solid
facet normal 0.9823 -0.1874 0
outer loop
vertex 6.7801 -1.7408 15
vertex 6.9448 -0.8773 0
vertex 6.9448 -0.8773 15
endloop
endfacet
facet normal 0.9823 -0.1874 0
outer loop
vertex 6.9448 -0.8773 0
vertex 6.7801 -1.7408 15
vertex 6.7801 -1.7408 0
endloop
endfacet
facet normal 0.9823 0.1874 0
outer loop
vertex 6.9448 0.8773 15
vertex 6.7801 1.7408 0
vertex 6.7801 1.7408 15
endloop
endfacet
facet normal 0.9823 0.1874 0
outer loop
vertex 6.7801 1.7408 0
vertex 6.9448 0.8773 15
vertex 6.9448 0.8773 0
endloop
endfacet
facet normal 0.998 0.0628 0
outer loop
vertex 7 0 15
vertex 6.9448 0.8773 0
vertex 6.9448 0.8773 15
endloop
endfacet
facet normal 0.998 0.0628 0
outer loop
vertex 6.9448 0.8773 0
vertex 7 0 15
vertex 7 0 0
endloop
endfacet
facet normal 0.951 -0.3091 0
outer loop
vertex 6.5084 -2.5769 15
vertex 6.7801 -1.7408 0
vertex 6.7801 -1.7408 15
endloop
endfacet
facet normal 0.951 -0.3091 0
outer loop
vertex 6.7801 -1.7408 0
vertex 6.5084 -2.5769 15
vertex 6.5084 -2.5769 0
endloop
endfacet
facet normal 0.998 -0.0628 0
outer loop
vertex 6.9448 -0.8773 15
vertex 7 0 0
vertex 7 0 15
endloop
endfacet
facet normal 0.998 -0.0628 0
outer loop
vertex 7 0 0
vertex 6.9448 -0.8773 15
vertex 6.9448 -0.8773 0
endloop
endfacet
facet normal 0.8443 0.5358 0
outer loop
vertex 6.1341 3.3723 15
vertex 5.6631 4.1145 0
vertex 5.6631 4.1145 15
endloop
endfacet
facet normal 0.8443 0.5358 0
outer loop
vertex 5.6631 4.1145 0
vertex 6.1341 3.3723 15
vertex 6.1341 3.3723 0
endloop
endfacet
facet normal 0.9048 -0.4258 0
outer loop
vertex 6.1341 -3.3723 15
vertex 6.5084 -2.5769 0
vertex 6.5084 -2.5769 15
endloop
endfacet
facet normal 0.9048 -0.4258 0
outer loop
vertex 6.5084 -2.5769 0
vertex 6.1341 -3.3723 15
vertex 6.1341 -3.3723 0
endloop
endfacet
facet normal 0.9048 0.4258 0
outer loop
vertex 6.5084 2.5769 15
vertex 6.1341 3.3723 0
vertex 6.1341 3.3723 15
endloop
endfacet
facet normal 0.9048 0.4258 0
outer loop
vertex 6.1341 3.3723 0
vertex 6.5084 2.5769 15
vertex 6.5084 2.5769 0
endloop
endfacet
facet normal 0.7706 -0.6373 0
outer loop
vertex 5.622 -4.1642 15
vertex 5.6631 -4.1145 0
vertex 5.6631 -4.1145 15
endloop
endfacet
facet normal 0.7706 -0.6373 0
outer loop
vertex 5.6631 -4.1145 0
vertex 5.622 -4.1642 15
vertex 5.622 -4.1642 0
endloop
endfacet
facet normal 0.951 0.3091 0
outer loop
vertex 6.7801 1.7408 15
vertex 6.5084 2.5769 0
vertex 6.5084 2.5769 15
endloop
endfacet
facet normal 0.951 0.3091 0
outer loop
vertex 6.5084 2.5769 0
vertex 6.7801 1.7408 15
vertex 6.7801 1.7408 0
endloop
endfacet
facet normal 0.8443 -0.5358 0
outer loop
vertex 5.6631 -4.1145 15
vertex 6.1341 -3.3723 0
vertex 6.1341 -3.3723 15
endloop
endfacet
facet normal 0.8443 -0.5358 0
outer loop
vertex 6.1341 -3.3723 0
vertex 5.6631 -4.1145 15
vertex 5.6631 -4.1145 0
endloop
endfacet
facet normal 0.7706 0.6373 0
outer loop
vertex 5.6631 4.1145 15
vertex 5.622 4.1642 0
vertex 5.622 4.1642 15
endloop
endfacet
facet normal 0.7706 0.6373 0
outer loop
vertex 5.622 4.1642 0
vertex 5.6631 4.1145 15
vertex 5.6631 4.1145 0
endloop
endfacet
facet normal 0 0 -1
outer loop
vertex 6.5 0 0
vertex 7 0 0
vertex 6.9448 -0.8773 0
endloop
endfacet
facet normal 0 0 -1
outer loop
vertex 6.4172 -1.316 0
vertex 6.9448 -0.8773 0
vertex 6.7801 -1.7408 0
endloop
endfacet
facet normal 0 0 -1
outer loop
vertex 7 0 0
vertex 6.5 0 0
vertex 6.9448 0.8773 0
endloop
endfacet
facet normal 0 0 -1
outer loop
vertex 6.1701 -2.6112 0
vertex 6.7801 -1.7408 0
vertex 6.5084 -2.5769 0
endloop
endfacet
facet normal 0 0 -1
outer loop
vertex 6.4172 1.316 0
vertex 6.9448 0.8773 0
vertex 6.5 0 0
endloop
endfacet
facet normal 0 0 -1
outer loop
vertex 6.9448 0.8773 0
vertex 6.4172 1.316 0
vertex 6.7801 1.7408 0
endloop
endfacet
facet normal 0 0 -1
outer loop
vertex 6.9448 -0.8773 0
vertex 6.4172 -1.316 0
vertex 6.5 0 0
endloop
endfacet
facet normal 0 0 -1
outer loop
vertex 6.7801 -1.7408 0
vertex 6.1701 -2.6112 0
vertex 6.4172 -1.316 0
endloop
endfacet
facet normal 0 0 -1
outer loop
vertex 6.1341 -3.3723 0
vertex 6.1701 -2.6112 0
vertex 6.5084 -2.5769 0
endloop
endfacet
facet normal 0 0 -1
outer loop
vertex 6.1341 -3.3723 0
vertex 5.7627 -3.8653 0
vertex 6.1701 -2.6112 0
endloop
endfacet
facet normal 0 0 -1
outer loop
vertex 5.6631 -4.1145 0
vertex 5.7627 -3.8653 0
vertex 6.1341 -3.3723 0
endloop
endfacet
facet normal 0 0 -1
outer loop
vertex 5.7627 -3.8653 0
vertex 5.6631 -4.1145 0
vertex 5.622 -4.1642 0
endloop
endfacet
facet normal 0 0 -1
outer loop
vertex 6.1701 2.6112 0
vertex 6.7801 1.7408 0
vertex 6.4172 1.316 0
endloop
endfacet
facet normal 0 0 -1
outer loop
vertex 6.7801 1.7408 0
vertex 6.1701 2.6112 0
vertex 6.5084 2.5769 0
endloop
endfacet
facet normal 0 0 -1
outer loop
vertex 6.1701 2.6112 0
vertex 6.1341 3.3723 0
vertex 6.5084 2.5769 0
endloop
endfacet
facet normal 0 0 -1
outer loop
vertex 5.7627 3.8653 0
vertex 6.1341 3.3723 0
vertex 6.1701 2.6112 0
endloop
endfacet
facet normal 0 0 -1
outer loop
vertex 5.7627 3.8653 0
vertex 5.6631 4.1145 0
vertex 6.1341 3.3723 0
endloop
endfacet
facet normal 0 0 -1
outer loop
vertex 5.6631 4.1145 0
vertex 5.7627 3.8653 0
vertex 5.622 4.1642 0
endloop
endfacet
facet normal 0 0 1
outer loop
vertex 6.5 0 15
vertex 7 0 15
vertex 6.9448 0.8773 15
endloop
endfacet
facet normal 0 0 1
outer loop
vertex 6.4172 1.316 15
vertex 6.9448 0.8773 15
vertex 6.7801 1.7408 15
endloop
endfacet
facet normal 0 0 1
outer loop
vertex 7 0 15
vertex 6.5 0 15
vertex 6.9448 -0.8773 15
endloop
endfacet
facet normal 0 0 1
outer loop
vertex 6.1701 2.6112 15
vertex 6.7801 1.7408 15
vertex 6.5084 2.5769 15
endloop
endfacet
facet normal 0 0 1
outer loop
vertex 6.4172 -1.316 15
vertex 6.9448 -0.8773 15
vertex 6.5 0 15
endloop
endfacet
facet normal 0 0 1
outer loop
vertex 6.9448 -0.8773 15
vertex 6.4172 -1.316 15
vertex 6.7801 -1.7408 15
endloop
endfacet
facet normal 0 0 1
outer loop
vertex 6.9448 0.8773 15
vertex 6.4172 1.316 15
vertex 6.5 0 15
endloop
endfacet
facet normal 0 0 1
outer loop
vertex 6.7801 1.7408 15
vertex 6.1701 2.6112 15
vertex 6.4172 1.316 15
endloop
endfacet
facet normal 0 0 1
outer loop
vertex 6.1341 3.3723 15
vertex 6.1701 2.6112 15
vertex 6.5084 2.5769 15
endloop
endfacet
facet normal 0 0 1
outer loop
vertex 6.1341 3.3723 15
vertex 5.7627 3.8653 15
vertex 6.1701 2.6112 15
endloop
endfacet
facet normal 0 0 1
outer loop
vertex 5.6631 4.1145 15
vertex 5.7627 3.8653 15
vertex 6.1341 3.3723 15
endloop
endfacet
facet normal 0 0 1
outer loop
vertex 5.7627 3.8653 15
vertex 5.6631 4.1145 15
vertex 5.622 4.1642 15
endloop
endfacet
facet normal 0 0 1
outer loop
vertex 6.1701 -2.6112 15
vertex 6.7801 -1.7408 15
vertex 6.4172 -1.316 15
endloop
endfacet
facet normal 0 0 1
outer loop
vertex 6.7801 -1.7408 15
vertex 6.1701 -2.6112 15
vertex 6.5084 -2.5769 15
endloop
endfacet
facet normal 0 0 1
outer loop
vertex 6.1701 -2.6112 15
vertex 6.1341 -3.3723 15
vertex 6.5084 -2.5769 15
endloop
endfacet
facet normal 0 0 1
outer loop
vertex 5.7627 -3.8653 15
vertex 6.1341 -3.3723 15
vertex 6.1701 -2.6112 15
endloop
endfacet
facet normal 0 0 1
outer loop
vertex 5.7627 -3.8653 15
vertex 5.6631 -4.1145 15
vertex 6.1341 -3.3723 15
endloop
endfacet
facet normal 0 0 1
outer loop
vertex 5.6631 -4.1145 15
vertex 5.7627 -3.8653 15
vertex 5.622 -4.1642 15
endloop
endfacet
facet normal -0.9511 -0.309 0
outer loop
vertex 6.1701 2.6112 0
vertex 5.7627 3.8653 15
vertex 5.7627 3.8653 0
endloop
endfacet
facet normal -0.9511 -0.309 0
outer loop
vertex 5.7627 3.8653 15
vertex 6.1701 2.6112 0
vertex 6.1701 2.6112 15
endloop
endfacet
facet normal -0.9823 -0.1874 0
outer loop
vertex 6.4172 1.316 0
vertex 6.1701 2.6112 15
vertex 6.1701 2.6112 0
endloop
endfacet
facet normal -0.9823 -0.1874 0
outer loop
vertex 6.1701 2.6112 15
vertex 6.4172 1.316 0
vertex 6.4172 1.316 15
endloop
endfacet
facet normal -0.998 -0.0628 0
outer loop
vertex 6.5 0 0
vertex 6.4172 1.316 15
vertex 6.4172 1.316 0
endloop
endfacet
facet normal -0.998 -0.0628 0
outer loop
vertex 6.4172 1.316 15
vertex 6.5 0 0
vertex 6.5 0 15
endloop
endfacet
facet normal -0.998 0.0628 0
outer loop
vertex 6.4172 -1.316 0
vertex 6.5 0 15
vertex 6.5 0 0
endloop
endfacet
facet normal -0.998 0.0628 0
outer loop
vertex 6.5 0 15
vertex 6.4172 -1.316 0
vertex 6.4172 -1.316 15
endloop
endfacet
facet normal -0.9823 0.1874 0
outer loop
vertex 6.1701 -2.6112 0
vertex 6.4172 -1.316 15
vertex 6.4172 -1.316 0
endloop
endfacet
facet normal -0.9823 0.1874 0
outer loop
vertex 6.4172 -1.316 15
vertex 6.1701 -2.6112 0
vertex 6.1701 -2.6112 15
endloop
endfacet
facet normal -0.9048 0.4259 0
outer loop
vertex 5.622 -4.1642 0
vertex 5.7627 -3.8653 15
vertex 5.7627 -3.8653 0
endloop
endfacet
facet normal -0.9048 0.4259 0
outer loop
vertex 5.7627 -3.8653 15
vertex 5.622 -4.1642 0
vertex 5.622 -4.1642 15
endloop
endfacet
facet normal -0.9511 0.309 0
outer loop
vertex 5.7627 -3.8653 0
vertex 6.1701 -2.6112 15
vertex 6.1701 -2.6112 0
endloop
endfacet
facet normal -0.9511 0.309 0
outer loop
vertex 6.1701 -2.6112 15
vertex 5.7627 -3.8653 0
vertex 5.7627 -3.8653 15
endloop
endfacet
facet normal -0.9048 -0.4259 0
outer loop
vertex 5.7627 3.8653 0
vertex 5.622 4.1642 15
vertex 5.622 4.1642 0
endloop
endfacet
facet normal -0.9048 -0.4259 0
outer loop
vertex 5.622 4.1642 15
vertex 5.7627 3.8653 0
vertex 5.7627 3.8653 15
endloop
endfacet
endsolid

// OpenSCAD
$fn = 50;


difference() {
	union() {
		cylinder(h = 15, r = 7.0000000000);
		translate(v = [-7.0000000000, 0, 0]) {
			cylinder(h = 15, r = 7.0000000000);
		}
	}
	union() {
		cylinder(h = 15, r = 3.2500000000);
		cylinder(h = 15, r = 1.8000000000);
		cylinder(h = 15, r = 1.8000000000);
		cylinder(h = 15, r = 1.8000000000);
		translate(v = [-11.5000000000, 0, 0]) {
			hull() {
				translate(v = [-3.7500000000, 0.0000000000, 0]) {
					cylinder(h = 15, r = 10.5000000000);
				}
				translate(v = [3.7500000000, 0.0000000000, 0]) {
					cylinder(h = 15, r = 10.5000000000);
				}
				translate(v = [-3.7500000000, -0.0000000000, 0]) {
					cylinder(h = 15, r = 10.5000000000);
				}
				translate(v = [3.7500000000, -0.0000000000, 0]) {
					cylinder(h = 15, r = 10.5000000000);
				}
			}
		}
		translate(v = [-4.0000000000, 0, 0.0000000000]) {
			cylinder(h = 15, r = 10.5000000000);
		}
	}
}
